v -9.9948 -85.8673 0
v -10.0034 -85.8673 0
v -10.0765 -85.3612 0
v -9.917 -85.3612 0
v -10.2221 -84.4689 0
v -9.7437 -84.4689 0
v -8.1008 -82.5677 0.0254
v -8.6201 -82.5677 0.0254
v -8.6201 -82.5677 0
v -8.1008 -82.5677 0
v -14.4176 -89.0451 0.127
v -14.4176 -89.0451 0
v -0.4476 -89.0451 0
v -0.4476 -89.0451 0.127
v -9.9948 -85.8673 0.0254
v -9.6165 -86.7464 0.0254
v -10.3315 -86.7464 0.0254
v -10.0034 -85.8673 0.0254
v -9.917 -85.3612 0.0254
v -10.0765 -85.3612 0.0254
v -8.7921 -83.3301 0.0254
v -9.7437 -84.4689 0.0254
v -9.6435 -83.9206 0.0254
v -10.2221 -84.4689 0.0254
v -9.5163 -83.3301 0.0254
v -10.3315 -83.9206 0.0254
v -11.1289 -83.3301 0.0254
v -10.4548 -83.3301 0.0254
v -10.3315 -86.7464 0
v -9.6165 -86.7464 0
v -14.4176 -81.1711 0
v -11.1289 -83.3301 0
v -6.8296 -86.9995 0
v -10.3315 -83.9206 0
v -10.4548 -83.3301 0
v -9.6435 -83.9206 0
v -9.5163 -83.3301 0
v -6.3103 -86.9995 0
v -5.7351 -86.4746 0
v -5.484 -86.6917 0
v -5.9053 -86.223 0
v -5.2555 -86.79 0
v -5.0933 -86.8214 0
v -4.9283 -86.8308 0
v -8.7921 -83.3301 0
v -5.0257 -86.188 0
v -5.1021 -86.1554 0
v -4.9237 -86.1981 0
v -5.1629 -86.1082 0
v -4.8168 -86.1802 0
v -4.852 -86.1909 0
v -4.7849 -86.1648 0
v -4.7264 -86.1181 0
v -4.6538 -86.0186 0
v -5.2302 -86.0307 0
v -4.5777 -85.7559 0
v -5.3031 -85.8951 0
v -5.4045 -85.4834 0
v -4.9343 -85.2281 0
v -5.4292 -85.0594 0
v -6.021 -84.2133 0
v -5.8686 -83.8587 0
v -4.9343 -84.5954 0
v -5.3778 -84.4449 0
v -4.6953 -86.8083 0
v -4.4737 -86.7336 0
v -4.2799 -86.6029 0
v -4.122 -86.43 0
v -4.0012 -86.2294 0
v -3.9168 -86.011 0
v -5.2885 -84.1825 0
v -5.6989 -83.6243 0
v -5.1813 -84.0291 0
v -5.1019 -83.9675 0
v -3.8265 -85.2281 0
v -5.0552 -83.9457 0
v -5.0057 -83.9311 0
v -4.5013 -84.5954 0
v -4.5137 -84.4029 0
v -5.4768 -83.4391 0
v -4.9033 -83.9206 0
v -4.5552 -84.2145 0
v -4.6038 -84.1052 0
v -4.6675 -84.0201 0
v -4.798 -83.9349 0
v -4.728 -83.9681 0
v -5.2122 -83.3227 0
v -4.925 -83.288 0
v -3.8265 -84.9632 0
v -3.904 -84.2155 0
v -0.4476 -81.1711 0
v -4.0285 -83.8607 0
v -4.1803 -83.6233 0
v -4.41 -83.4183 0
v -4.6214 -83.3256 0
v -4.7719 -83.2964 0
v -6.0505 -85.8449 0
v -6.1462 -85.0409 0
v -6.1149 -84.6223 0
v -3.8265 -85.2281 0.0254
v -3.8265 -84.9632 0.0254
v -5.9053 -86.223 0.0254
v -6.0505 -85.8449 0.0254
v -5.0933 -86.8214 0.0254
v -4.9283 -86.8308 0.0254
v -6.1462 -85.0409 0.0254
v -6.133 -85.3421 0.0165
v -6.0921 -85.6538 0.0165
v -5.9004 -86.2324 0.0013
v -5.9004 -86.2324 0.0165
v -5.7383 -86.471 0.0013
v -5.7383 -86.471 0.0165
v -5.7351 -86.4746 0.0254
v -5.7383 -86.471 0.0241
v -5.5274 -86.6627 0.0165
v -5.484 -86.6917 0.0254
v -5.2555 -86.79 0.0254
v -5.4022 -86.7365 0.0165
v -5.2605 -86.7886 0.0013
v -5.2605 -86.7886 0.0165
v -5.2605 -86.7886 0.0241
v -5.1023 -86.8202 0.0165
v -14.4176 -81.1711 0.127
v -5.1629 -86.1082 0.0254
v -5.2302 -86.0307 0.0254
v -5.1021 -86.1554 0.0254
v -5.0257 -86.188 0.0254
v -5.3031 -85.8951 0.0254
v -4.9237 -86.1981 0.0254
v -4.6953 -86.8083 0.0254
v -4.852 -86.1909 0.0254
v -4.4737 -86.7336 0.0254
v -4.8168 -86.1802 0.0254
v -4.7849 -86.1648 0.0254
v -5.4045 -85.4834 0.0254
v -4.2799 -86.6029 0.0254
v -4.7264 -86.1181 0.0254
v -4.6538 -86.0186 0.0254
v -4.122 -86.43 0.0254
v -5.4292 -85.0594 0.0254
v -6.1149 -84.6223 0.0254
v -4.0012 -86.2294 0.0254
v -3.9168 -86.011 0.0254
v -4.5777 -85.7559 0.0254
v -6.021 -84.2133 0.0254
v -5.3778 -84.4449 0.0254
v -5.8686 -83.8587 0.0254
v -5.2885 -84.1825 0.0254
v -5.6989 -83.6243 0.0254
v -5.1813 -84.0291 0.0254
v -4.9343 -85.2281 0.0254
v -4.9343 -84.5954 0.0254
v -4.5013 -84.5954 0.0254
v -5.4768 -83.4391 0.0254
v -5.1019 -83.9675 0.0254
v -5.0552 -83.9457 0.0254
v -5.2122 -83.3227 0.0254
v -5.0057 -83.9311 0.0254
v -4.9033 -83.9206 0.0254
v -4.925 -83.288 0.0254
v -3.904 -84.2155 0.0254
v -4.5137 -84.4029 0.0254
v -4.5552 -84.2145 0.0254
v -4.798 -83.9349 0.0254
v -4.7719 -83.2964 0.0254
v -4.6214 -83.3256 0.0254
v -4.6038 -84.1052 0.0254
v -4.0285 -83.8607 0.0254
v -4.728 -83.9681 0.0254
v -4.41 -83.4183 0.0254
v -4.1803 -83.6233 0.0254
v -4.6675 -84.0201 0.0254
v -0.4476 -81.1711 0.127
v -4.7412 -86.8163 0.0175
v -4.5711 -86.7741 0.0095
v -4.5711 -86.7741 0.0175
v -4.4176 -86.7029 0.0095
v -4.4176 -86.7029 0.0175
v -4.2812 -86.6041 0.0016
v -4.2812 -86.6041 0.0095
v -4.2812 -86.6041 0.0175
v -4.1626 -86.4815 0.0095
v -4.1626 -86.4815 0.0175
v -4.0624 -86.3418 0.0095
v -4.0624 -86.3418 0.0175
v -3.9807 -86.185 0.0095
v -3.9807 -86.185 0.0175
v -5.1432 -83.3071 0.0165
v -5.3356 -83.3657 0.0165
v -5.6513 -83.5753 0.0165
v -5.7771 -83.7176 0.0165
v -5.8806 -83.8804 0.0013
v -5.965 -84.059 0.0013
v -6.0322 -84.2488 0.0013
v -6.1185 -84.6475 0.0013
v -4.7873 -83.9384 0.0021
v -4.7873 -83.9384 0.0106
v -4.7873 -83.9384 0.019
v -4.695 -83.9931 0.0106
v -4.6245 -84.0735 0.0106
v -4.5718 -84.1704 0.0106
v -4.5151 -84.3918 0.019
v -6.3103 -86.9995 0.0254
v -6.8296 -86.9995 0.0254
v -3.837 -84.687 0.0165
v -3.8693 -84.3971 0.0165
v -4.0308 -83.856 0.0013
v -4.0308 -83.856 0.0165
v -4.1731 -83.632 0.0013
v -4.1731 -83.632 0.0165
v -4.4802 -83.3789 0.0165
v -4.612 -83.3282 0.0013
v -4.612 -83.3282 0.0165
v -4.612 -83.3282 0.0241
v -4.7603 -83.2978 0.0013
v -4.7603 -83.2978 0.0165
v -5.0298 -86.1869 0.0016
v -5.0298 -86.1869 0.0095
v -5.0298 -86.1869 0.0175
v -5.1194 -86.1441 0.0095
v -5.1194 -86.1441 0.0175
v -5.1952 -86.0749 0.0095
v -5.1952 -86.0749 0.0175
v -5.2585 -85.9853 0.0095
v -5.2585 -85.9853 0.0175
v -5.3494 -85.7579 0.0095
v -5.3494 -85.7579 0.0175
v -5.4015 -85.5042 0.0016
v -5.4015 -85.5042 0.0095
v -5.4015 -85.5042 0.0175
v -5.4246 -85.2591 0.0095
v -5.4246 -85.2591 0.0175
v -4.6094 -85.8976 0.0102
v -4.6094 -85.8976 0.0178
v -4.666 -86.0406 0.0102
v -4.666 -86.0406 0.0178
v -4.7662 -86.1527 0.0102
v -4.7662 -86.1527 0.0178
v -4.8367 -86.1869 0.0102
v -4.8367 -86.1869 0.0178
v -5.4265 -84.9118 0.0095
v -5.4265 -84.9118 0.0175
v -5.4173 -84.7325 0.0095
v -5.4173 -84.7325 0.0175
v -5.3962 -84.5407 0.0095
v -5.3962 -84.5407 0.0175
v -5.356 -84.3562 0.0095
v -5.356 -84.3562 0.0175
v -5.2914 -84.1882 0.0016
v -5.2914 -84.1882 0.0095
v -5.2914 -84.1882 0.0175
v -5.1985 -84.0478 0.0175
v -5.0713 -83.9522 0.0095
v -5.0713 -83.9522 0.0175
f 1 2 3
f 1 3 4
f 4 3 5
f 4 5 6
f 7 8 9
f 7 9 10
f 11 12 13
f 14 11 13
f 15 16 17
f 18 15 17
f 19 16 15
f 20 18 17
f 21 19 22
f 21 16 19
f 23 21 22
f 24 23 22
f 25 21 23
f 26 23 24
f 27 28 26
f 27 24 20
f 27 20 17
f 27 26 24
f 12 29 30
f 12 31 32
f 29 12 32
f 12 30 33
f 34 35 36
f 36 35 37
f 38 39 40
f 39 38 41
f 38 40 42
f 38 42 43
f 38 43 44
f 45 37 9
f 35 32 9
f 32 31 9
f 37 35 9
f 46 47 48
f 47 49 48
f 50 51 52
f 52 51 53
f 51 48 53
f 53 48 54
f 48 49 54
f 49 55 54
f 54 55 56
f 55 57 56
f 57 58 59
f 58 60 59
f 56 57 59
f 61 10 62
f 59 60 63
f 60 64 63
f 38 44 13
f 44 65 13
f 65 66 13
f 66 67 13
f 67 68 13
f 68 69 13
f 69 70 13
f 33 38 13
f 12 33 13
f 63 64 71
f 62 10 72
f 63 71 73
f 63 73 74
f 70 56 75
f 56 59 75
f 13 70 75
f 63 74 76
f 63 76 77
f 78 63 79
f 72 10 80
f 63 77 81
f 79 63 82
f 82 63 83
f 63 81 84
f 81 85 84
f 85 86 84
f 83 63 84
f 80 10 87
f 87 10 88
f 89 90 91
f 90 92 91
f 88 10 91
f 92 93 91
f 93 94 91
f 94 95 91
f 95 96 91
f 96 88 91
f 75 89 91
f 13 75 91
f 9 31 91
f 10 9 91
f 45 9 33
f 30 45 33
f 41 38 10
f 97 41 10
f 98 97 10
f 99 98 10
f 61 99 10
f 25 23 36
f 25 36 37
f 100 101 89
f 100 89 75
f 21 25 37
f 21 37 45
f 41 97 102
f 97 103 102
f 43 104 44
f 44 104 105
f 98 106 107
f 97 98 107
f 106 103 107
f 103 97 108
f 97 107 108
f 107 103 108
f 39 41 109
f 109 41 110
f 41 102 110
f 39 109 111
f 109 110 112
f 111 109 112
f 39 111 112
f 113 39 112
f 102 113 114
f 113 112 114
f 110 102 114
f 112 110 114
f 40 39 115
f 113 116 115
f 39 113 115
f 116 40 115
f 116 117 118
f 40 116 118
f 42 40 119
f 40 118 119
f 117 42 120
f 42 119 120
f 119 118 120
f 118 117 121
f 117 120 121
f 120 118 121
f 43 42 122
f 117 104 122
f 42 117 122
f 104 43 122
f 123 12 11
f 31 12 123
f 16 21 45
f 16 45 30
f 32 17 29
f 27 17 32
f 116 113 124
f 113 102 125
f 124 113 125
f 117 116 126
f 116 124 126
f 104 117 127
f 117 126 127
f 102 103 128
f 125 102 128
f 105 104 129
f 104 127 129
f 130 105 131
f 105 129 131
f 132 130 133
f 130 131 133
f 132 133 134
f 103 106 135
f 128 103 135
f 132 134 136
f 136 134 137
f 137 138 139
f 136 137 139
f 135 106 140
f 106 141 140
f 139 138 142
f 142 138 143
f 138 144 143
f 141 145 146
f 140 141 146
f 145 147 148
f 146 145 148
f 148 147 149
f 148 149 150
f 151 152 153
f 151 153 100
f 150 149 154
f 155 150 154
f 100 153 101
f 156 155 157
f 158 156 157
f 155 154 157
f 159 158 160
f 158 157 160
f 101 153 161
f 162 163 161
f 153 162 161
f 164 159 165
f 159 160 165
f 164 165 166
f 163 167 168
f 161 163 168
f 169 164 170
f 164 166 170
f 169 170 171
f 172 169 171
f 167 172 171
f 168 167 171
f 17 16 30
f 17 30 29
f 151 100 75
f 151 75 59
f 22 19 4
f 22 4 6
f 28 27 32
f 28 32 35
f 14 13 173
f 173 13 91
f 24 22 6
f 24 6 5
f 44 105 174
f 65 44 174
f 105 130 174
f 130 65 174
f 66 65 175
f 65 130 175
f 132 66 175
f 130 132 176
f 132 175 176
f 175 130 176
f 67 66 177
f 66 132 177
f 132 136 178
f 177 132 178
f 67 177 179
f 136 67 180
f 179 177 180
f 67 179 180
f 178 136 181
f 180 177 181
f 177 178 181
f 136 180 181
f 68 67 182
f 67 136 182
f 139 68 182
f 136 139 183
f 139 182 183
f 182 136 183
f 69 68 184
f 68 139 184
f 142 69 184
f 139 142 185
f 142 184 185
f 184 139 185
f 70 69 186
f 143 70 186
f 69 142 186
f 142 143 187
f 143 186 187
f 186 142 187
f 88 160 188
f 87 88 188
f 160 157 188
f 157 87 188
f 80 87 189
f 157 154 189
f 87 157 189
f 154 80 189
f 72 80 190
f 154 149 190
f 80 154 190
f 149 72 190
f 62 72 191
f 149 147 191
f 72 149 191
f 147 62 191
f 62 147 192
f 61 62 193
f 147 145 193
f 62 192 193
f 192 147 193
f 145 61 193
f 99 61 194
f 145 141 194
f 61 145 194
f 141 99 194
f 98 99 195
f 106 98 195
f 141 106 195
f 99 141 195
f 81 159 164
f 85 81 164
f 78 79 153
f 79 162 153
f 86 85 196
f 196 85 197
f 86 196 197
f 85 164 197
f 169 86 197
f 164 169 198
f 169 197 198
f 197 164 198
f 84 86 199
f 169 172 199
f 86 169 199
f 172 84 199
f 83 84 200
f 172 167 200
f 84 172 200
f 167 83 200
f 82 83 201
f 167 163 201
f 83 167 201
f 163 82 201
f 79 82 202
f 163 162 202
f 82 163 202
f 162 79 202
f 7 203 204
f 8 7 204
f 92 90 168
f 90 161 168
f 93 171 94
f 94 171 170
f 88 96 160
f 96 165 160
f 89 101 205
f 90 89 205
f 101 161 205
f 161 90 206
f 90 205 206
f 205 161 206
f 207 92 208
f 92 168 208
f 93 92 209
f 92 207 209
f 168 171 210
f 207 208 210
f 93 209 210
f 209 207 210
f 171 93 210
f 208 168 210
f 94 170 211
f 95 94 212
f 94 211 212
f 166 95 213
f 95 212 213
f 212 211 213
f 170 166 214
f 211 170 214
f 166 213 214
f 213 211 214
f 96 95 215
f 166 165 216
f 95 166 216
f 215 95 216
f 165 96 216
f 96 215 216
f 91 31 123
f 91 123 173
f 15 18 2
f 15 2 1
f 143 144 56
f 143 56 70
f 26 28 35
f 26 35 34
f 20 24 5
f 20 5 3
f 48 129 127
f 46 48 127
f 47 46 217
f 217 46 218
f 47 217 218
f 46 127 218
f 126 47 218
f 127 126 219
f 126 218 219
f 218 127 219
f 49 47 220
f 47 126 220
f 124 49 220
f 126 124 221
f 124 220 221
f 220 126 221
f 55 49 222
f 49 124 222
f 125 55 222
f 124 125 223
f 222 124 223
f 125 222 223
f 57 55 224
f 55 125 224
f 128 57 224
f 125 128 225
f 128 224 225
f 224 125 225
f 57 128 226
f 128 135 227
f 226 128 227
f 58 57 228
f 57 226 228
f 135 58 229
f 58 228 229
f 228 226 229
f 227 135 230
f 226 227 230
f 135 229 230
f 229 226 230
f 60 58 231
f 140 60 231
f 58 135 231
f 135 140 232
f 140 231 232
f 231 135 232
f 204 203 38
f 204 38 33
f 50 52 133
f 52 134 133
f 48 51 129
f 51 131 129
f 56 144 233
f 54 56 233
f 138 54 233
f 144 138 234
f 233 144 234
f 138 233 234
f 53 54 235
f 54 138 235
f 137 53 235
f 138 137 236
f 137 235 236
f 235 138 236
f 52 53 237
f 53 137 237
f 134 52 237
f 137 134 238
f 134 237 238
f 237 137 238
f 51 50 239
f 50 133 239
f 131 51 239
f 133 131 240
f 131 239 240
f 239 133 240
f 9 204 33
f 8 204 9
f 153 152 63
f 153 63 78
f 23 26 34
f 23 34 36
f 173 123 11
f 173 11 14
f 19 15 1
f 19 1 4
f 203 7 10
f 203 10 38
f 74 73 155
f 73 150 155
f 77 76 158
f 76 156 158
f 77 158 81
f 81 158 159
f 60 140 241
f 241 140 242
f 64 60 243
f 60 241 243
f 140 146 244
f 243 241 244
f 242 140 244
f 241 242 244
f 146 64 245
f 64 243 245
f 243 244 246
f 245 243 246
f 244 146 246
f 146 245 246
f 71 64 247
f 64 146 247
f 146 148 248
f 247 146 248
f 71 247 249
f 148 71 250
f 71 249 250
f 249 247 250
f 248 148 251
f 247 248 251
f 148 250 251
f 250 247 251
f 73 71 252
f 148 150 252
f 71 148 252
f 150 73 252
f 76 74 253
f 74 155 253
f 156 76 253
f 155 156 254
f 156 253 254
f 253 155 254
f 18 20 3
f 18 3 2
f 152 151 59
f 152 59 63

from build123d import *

# Parameters (mm, degrees)
SKETCH1_W           = 13.97
SKETCH1_H           = 7.874
BOSS_EXTRUDE1_DEPTH = 0.127
WRAP2_START         = -0.0254
WRAP2_DEPTH         = 0.0254


# Read off the part's stored shape, not the designer's step: Wrap2
with BuildPart() as part:
    # Sketch1 → Boss-Extrude1 (new body)
    with BuildSketch(Plane.XY):
        with Locations((-7.432564008, -85.108134992)):
            Rectangle(SKETCH1_W, SKETCH1_H)
    extrude(amount=BOSS_EXTRUDE1_DEPTH)

    # Wrap2 outline → Wrap2 (cut)
    # profile 1 of 3: a face of its own
    with BuildSketch(Plane(origin=(0, 0, 0), x_dir=(-1, 0, 0), z_dir=(0, 0, -1)).offset(WRAP2_START)):
        with BuildLine():
            add(Edge.make_bspline(
                [(3.826469564, -84.963158025), (3.827010027, -84.917677488), (3.828104792, -84.825552), (3.836108508, -84.685484109), (3.850519029, -84.542286335), (3.867873709, -84.396902881), (3.893643168, -84.253181502), (3.929096048, -84.114035219), (3.974808247, -83.981817181), (4.028342433, -83.855668459), (4.093310971, -83.738030743), (4.170886206, -83.63021293), (4.261303249, -83.533608273), (4.345926352, -83.46180179), (4.419782346, -83.410748531), (4.480095673, -83.377701727), (4.544461085, -83.350231984), (4.612521738, -83.326528765), (4.68521128, -83.310415652), (4.76135621, -83.29638795), (4.841881411, -83.289666964), (4.896910681, -83.288536329), (4.925036713, -83.287958449)],
                knots=[0, 0, 0, 0, 0.060393733, 0.122333696, 0.186219252, 0.251490299, 0.316717007, 0.37996741, 0.441958181, 0.502323024, 0.561736642, 0.620028303, 0.678231582, 0.737019629, 0.767036674, 0.797324631, 0.82815831, 0.859890953, 0.892862392, 0.926911734, 0.962643827, 1, 1, 1, 1], degree=3))
            Line((3.826469564, -84.963158025), (3.826469564, -85.228079437))
            Line((3.826469564, -85.228079437), (4.934262831, -85.228079437))
            Line((4.934262831, -85.228079437), (4.934262831, -84.595431289))
            Line((4.934262831, -84.595431289), (4.501294255, -84.595431289))
            add(Edge.make_bspline(
                [(4.903289433, -83.920606597), (4.883020015, -83.921518297), (4.843781227, -83.923283222), (4.787539956, -83.936120227), (4.737731616, -83.960032853), (4.694035563, -83.991873703), (4.65677765, -84.030716275), (4.623681087, -84.073267778), (4.594108521, -84.119444237), (4.563257184, -84.187706346), (4.533369818, -84.278281117), (4.51402702, -84.389637441), (4.503598137, -84.495710962), (4.502025527, -84.563779213), (4.501294255, -84.595431289)],
                knots=[0, 0, 0, 0, 0.069384746, 0.134319266, 0.195878399, 0.257248919, 0.318402508, 0.379477442, 0.441653576, 0.505574289, 0.6354172, 0.766982137, 0.891645533, 1, 1, 1, 1], degree=3))
            add(Edge.make_bspline(
                [(5.429178206, -85.059373264), (5.429024369, -85.03608762), (5.428699232, -84.986872999), (5.426790574, -84.909085734), (5.422505919, -84.823427687), (5.417557397, -84.731338954), (5.410538619, -84.635978716), (5.397054266, -84.540994333), (5.379156301, -84.447765598), (5.357372325, -84.356826658), (5.32958417, -84.26947942), (5.293509852, -84.188591179), (5.24988398, -84.114578629), (5.201121993, -84.047039536), (5.142120957, -83.990169438), (5.071724956, -83.948809925), (4.990496804, -83.9246758), (4.933110214, -83.921998071), (4.903289433, -83.920606597)],
                knots=[0, 0, 0, 0, 0.050260659, 0.106226792, 0.167930094, 0.235364177, 0.305294022, 0.374224991, 0.442292833, 0.510140692, 0.575963688, 0.639847254, 0.700835971, 0.761146376, 0.819171409, 0.876337748, 0.935739257, 1, 1, 1, 1], degree=3))
            add(Edge.make_bspline(
                [(4.923718696, -86.198139931), (4.941978047, -86.197983673), (4.977659622, -86.197678321), (5.029590573, -86.188774852), (5.077051545, -86.170390041), (5.120666255, -86.144993152), (5.159731256, -86.112253488), (5.196358978, -86.074948111), (5.230215367, -86.032855586), (5.269845718, -85.967732887), (5.313768574, -85.877005825), (5.351216379, -85.757043204), (5.381026394, -85.631798202), (5.402269582, -85.505075767), (5.417756569, -85.381079587), (5.425040742, -85.262874233), (5.428004678, -85.156264467), (5.428811028, -85.089688945), (5.429178206, -85.059373264)],
                knots=[0, 0, 0, 0, 0.039954261, 0.078076757, 0.114618514, 0.150839038, 0.188105085, 0.225864661, 0.265232508, 0.306077519, 0.392572504, 0.485217949, 0.580663708, 0.674382043, 0.766451173, 0.854194653, 0.933606403, 1, 1, 1, 1], degree=3))
            add(Edge.make_bspline(
                [(4.57773924, -85.755945235), (4.582577242, -85.778348376), (4.592791408, -85.825646697), (4.608395816, -85.89847248), (4.631209267, -85.972009886), (4.663647447, -86.041845309), (4.70942621, -86.102520974), (4.754973641, -86.147029353), (4.799200923, -86.173778979), (4.837098167, -86.188186847), (4.879168417, -86.196926256), (4.908517542, -86.197725809), (4.923718696, -86.198139931)],
                knots=[0, 0, 0, 0, 0.111459761, 0.235317872, 0.361999582, 0.485262074, 0.607464743, 0.729909934, 0.79219494, 0.857458843, 0.926171904, 1, 1, 1, 1], degree=3))
            Line((4.57773924, -85.755945235), (3.916753726, -86.01098152))
            add(Edge.make_bspline(
                [(4.928331755, -86.830788079), (4.896434292, -86.830332212), (4.833749721, -86.829436348), (4.742047146, -86.817132973), (4.654126811, -86.801194053), (4.571134339, -86.775092112), (4.491560198, -86.74425801), (4.417258458, -86.703781354), (4.345830532, -86.658720769), (4.280219139, -86.604886836), (4.219315678, -86.545306137), (4.161721217, -86.482381172), (4.109294678, -86.414342392), (4.061486444, -86.342341386), (4.018231492, -86.265633071), (3.979613777, -86.18479514), (3.945045633, -86.099679103), (3.926255949, -86.040771812), (3.916753726, -86.01098152)],
                knots=[0, 0, 0, 0, 0.06797528, 0.133584331, 0.197076538, 0.25828747, 0.318840405, 0.378783068, 0.438433894, 0.49872708, 0.559361524, 0.620061096, 0.680506997, 0.742360057, 0.804250369, 0.868164685, 0.933328923, 1, 1, 1, 1], degree=3))
            add(Edge.make_bspline(
                [(6.14617944, -85.040921026), (6.145521872, -85.090800393), (6.144196793, -85.191313407), (6.134042597, -85.34350023), (6.11665869, -85.498005886), (6.093538793, -85.653878197), (6.062363872, -85.807745753), (6.018887243, -85.956012754), (5.966707906, -86.098134931), (5.90283112, -86.232639552), (5.828171088, -86.358305611), (5.740679889, -86.472773753), (5.640121565, -86.574558841), (5.54767066, -86.650447491), (5.467099706, -86.703334293), (5.402229448, -86.738037504), (5.332739537, -86.765751972), (5.259832099, -86.790003038), (5.182616631, -86.808196765), (5.101355264, -86.821285924), (5.016142878, -86.829352977), (4.958005093, -86.830303126), (4.928331755, -86.830788079)],
                knots=[0, 0, 0, 0, 0.061459125, 0.123847641, 0.187845431, 0.252999934, 0.317977647, 0.381110967, 0.443205197, 0.50434819, 0.564324292, 0.62301118, 0.681390769, 0.740278313, 0.77000872, 0.800038277, 0.830750549, 0.862079276, 0.894643031, 0.928373853, 0.963442246, 1, 1, 1, 1], degree=3))
            add(Edge.make_bspline(
                [(4.925036713, -83.287958449), (4.962652324, -83.288728972), (5.035765254, -83.290226625), (5.142181401, -83.305182693), (5.242179768, -83.329163602), (5.335515369, -83.363965041), (5.422760168, -83.406508535), (5.505044685, -83.455300925), (5.581568633, -83.511420955), (5.652295495, -83.574395033), (5.717470366, -83.643361149), (5.778256244, -83.716667025), (5.832585948, -83.796167108), (5.881609023, -83.880006865), (5.92560631, -83.968130055), (5.96591433, -84.058848519), (6.001368692, -84.152702414), (6.043531579, -84.281209473), (6.08653268, -84.445801174), (6.120163208, -84.646159486), (6.142505611, -84.844689175), (6.14496925, -84.976280597), (6.14617944, -85.040921026)],
                knots=[0, 0, 0, 0, 0.047256178, 0.091851162, 0.134778824, 0.176275084, 0.216781148, 0.256653584, 0.296362193, 0.335871578, 0.375518698, 0.415540005, 0.455443979, 0.496407668, 0.537528331, 0.579189623, 0.621138159, 0.663574591, 0.749164871, 0.834643731, 0.918773579, 1, 1, 1, 1], degree=3))
        make_face()
    # profile 2 of 3: a face of its own
    with BuildSketch(Plane(origin=(0, 0, 0), x_dir=(-1, 0, 0), z_dir=(0, 0, -1)).offset(WRAP2_START)):
        Polygon((6.829571242, -86.999494252), (8.620097303, -82.567662172), (8.100798615, -82.567662172), (6.310272554, -86.999494252), align=None)
    # profile 3 of 3: a face of its own
    with BuildSketch(Plane(origin=(0, 0, 0), x_dir=(-1, 0, 0), z_dir=(0, 0, -1)).offset(WRAP2_START)):
        Polygon((9.643537484, -83.920606597), (9.516348846, -83.330134992), (8.792098518, -83.330134992), (9.616518136, -86.746434992), (10.331542345, -86.746434992), (11.128942615, -83.330134992), (10.454776933, -83.330134992), (10.331542345, -83.920606597), align=None)
        Polygon((10.076506061, -85.361199151), (10.003356118, -85.86731767), (9.994789008, -85.86731767), (9.917026007, -85.361199151), (9.743706774, -84.468901659), (10.222146936, -84.468901659), align=None, mode=Mode.SUBTRACT)
    extrude(amount=WRAP2_DEPTH, mode=Mode.SUBTRACT)


solid = part.part
